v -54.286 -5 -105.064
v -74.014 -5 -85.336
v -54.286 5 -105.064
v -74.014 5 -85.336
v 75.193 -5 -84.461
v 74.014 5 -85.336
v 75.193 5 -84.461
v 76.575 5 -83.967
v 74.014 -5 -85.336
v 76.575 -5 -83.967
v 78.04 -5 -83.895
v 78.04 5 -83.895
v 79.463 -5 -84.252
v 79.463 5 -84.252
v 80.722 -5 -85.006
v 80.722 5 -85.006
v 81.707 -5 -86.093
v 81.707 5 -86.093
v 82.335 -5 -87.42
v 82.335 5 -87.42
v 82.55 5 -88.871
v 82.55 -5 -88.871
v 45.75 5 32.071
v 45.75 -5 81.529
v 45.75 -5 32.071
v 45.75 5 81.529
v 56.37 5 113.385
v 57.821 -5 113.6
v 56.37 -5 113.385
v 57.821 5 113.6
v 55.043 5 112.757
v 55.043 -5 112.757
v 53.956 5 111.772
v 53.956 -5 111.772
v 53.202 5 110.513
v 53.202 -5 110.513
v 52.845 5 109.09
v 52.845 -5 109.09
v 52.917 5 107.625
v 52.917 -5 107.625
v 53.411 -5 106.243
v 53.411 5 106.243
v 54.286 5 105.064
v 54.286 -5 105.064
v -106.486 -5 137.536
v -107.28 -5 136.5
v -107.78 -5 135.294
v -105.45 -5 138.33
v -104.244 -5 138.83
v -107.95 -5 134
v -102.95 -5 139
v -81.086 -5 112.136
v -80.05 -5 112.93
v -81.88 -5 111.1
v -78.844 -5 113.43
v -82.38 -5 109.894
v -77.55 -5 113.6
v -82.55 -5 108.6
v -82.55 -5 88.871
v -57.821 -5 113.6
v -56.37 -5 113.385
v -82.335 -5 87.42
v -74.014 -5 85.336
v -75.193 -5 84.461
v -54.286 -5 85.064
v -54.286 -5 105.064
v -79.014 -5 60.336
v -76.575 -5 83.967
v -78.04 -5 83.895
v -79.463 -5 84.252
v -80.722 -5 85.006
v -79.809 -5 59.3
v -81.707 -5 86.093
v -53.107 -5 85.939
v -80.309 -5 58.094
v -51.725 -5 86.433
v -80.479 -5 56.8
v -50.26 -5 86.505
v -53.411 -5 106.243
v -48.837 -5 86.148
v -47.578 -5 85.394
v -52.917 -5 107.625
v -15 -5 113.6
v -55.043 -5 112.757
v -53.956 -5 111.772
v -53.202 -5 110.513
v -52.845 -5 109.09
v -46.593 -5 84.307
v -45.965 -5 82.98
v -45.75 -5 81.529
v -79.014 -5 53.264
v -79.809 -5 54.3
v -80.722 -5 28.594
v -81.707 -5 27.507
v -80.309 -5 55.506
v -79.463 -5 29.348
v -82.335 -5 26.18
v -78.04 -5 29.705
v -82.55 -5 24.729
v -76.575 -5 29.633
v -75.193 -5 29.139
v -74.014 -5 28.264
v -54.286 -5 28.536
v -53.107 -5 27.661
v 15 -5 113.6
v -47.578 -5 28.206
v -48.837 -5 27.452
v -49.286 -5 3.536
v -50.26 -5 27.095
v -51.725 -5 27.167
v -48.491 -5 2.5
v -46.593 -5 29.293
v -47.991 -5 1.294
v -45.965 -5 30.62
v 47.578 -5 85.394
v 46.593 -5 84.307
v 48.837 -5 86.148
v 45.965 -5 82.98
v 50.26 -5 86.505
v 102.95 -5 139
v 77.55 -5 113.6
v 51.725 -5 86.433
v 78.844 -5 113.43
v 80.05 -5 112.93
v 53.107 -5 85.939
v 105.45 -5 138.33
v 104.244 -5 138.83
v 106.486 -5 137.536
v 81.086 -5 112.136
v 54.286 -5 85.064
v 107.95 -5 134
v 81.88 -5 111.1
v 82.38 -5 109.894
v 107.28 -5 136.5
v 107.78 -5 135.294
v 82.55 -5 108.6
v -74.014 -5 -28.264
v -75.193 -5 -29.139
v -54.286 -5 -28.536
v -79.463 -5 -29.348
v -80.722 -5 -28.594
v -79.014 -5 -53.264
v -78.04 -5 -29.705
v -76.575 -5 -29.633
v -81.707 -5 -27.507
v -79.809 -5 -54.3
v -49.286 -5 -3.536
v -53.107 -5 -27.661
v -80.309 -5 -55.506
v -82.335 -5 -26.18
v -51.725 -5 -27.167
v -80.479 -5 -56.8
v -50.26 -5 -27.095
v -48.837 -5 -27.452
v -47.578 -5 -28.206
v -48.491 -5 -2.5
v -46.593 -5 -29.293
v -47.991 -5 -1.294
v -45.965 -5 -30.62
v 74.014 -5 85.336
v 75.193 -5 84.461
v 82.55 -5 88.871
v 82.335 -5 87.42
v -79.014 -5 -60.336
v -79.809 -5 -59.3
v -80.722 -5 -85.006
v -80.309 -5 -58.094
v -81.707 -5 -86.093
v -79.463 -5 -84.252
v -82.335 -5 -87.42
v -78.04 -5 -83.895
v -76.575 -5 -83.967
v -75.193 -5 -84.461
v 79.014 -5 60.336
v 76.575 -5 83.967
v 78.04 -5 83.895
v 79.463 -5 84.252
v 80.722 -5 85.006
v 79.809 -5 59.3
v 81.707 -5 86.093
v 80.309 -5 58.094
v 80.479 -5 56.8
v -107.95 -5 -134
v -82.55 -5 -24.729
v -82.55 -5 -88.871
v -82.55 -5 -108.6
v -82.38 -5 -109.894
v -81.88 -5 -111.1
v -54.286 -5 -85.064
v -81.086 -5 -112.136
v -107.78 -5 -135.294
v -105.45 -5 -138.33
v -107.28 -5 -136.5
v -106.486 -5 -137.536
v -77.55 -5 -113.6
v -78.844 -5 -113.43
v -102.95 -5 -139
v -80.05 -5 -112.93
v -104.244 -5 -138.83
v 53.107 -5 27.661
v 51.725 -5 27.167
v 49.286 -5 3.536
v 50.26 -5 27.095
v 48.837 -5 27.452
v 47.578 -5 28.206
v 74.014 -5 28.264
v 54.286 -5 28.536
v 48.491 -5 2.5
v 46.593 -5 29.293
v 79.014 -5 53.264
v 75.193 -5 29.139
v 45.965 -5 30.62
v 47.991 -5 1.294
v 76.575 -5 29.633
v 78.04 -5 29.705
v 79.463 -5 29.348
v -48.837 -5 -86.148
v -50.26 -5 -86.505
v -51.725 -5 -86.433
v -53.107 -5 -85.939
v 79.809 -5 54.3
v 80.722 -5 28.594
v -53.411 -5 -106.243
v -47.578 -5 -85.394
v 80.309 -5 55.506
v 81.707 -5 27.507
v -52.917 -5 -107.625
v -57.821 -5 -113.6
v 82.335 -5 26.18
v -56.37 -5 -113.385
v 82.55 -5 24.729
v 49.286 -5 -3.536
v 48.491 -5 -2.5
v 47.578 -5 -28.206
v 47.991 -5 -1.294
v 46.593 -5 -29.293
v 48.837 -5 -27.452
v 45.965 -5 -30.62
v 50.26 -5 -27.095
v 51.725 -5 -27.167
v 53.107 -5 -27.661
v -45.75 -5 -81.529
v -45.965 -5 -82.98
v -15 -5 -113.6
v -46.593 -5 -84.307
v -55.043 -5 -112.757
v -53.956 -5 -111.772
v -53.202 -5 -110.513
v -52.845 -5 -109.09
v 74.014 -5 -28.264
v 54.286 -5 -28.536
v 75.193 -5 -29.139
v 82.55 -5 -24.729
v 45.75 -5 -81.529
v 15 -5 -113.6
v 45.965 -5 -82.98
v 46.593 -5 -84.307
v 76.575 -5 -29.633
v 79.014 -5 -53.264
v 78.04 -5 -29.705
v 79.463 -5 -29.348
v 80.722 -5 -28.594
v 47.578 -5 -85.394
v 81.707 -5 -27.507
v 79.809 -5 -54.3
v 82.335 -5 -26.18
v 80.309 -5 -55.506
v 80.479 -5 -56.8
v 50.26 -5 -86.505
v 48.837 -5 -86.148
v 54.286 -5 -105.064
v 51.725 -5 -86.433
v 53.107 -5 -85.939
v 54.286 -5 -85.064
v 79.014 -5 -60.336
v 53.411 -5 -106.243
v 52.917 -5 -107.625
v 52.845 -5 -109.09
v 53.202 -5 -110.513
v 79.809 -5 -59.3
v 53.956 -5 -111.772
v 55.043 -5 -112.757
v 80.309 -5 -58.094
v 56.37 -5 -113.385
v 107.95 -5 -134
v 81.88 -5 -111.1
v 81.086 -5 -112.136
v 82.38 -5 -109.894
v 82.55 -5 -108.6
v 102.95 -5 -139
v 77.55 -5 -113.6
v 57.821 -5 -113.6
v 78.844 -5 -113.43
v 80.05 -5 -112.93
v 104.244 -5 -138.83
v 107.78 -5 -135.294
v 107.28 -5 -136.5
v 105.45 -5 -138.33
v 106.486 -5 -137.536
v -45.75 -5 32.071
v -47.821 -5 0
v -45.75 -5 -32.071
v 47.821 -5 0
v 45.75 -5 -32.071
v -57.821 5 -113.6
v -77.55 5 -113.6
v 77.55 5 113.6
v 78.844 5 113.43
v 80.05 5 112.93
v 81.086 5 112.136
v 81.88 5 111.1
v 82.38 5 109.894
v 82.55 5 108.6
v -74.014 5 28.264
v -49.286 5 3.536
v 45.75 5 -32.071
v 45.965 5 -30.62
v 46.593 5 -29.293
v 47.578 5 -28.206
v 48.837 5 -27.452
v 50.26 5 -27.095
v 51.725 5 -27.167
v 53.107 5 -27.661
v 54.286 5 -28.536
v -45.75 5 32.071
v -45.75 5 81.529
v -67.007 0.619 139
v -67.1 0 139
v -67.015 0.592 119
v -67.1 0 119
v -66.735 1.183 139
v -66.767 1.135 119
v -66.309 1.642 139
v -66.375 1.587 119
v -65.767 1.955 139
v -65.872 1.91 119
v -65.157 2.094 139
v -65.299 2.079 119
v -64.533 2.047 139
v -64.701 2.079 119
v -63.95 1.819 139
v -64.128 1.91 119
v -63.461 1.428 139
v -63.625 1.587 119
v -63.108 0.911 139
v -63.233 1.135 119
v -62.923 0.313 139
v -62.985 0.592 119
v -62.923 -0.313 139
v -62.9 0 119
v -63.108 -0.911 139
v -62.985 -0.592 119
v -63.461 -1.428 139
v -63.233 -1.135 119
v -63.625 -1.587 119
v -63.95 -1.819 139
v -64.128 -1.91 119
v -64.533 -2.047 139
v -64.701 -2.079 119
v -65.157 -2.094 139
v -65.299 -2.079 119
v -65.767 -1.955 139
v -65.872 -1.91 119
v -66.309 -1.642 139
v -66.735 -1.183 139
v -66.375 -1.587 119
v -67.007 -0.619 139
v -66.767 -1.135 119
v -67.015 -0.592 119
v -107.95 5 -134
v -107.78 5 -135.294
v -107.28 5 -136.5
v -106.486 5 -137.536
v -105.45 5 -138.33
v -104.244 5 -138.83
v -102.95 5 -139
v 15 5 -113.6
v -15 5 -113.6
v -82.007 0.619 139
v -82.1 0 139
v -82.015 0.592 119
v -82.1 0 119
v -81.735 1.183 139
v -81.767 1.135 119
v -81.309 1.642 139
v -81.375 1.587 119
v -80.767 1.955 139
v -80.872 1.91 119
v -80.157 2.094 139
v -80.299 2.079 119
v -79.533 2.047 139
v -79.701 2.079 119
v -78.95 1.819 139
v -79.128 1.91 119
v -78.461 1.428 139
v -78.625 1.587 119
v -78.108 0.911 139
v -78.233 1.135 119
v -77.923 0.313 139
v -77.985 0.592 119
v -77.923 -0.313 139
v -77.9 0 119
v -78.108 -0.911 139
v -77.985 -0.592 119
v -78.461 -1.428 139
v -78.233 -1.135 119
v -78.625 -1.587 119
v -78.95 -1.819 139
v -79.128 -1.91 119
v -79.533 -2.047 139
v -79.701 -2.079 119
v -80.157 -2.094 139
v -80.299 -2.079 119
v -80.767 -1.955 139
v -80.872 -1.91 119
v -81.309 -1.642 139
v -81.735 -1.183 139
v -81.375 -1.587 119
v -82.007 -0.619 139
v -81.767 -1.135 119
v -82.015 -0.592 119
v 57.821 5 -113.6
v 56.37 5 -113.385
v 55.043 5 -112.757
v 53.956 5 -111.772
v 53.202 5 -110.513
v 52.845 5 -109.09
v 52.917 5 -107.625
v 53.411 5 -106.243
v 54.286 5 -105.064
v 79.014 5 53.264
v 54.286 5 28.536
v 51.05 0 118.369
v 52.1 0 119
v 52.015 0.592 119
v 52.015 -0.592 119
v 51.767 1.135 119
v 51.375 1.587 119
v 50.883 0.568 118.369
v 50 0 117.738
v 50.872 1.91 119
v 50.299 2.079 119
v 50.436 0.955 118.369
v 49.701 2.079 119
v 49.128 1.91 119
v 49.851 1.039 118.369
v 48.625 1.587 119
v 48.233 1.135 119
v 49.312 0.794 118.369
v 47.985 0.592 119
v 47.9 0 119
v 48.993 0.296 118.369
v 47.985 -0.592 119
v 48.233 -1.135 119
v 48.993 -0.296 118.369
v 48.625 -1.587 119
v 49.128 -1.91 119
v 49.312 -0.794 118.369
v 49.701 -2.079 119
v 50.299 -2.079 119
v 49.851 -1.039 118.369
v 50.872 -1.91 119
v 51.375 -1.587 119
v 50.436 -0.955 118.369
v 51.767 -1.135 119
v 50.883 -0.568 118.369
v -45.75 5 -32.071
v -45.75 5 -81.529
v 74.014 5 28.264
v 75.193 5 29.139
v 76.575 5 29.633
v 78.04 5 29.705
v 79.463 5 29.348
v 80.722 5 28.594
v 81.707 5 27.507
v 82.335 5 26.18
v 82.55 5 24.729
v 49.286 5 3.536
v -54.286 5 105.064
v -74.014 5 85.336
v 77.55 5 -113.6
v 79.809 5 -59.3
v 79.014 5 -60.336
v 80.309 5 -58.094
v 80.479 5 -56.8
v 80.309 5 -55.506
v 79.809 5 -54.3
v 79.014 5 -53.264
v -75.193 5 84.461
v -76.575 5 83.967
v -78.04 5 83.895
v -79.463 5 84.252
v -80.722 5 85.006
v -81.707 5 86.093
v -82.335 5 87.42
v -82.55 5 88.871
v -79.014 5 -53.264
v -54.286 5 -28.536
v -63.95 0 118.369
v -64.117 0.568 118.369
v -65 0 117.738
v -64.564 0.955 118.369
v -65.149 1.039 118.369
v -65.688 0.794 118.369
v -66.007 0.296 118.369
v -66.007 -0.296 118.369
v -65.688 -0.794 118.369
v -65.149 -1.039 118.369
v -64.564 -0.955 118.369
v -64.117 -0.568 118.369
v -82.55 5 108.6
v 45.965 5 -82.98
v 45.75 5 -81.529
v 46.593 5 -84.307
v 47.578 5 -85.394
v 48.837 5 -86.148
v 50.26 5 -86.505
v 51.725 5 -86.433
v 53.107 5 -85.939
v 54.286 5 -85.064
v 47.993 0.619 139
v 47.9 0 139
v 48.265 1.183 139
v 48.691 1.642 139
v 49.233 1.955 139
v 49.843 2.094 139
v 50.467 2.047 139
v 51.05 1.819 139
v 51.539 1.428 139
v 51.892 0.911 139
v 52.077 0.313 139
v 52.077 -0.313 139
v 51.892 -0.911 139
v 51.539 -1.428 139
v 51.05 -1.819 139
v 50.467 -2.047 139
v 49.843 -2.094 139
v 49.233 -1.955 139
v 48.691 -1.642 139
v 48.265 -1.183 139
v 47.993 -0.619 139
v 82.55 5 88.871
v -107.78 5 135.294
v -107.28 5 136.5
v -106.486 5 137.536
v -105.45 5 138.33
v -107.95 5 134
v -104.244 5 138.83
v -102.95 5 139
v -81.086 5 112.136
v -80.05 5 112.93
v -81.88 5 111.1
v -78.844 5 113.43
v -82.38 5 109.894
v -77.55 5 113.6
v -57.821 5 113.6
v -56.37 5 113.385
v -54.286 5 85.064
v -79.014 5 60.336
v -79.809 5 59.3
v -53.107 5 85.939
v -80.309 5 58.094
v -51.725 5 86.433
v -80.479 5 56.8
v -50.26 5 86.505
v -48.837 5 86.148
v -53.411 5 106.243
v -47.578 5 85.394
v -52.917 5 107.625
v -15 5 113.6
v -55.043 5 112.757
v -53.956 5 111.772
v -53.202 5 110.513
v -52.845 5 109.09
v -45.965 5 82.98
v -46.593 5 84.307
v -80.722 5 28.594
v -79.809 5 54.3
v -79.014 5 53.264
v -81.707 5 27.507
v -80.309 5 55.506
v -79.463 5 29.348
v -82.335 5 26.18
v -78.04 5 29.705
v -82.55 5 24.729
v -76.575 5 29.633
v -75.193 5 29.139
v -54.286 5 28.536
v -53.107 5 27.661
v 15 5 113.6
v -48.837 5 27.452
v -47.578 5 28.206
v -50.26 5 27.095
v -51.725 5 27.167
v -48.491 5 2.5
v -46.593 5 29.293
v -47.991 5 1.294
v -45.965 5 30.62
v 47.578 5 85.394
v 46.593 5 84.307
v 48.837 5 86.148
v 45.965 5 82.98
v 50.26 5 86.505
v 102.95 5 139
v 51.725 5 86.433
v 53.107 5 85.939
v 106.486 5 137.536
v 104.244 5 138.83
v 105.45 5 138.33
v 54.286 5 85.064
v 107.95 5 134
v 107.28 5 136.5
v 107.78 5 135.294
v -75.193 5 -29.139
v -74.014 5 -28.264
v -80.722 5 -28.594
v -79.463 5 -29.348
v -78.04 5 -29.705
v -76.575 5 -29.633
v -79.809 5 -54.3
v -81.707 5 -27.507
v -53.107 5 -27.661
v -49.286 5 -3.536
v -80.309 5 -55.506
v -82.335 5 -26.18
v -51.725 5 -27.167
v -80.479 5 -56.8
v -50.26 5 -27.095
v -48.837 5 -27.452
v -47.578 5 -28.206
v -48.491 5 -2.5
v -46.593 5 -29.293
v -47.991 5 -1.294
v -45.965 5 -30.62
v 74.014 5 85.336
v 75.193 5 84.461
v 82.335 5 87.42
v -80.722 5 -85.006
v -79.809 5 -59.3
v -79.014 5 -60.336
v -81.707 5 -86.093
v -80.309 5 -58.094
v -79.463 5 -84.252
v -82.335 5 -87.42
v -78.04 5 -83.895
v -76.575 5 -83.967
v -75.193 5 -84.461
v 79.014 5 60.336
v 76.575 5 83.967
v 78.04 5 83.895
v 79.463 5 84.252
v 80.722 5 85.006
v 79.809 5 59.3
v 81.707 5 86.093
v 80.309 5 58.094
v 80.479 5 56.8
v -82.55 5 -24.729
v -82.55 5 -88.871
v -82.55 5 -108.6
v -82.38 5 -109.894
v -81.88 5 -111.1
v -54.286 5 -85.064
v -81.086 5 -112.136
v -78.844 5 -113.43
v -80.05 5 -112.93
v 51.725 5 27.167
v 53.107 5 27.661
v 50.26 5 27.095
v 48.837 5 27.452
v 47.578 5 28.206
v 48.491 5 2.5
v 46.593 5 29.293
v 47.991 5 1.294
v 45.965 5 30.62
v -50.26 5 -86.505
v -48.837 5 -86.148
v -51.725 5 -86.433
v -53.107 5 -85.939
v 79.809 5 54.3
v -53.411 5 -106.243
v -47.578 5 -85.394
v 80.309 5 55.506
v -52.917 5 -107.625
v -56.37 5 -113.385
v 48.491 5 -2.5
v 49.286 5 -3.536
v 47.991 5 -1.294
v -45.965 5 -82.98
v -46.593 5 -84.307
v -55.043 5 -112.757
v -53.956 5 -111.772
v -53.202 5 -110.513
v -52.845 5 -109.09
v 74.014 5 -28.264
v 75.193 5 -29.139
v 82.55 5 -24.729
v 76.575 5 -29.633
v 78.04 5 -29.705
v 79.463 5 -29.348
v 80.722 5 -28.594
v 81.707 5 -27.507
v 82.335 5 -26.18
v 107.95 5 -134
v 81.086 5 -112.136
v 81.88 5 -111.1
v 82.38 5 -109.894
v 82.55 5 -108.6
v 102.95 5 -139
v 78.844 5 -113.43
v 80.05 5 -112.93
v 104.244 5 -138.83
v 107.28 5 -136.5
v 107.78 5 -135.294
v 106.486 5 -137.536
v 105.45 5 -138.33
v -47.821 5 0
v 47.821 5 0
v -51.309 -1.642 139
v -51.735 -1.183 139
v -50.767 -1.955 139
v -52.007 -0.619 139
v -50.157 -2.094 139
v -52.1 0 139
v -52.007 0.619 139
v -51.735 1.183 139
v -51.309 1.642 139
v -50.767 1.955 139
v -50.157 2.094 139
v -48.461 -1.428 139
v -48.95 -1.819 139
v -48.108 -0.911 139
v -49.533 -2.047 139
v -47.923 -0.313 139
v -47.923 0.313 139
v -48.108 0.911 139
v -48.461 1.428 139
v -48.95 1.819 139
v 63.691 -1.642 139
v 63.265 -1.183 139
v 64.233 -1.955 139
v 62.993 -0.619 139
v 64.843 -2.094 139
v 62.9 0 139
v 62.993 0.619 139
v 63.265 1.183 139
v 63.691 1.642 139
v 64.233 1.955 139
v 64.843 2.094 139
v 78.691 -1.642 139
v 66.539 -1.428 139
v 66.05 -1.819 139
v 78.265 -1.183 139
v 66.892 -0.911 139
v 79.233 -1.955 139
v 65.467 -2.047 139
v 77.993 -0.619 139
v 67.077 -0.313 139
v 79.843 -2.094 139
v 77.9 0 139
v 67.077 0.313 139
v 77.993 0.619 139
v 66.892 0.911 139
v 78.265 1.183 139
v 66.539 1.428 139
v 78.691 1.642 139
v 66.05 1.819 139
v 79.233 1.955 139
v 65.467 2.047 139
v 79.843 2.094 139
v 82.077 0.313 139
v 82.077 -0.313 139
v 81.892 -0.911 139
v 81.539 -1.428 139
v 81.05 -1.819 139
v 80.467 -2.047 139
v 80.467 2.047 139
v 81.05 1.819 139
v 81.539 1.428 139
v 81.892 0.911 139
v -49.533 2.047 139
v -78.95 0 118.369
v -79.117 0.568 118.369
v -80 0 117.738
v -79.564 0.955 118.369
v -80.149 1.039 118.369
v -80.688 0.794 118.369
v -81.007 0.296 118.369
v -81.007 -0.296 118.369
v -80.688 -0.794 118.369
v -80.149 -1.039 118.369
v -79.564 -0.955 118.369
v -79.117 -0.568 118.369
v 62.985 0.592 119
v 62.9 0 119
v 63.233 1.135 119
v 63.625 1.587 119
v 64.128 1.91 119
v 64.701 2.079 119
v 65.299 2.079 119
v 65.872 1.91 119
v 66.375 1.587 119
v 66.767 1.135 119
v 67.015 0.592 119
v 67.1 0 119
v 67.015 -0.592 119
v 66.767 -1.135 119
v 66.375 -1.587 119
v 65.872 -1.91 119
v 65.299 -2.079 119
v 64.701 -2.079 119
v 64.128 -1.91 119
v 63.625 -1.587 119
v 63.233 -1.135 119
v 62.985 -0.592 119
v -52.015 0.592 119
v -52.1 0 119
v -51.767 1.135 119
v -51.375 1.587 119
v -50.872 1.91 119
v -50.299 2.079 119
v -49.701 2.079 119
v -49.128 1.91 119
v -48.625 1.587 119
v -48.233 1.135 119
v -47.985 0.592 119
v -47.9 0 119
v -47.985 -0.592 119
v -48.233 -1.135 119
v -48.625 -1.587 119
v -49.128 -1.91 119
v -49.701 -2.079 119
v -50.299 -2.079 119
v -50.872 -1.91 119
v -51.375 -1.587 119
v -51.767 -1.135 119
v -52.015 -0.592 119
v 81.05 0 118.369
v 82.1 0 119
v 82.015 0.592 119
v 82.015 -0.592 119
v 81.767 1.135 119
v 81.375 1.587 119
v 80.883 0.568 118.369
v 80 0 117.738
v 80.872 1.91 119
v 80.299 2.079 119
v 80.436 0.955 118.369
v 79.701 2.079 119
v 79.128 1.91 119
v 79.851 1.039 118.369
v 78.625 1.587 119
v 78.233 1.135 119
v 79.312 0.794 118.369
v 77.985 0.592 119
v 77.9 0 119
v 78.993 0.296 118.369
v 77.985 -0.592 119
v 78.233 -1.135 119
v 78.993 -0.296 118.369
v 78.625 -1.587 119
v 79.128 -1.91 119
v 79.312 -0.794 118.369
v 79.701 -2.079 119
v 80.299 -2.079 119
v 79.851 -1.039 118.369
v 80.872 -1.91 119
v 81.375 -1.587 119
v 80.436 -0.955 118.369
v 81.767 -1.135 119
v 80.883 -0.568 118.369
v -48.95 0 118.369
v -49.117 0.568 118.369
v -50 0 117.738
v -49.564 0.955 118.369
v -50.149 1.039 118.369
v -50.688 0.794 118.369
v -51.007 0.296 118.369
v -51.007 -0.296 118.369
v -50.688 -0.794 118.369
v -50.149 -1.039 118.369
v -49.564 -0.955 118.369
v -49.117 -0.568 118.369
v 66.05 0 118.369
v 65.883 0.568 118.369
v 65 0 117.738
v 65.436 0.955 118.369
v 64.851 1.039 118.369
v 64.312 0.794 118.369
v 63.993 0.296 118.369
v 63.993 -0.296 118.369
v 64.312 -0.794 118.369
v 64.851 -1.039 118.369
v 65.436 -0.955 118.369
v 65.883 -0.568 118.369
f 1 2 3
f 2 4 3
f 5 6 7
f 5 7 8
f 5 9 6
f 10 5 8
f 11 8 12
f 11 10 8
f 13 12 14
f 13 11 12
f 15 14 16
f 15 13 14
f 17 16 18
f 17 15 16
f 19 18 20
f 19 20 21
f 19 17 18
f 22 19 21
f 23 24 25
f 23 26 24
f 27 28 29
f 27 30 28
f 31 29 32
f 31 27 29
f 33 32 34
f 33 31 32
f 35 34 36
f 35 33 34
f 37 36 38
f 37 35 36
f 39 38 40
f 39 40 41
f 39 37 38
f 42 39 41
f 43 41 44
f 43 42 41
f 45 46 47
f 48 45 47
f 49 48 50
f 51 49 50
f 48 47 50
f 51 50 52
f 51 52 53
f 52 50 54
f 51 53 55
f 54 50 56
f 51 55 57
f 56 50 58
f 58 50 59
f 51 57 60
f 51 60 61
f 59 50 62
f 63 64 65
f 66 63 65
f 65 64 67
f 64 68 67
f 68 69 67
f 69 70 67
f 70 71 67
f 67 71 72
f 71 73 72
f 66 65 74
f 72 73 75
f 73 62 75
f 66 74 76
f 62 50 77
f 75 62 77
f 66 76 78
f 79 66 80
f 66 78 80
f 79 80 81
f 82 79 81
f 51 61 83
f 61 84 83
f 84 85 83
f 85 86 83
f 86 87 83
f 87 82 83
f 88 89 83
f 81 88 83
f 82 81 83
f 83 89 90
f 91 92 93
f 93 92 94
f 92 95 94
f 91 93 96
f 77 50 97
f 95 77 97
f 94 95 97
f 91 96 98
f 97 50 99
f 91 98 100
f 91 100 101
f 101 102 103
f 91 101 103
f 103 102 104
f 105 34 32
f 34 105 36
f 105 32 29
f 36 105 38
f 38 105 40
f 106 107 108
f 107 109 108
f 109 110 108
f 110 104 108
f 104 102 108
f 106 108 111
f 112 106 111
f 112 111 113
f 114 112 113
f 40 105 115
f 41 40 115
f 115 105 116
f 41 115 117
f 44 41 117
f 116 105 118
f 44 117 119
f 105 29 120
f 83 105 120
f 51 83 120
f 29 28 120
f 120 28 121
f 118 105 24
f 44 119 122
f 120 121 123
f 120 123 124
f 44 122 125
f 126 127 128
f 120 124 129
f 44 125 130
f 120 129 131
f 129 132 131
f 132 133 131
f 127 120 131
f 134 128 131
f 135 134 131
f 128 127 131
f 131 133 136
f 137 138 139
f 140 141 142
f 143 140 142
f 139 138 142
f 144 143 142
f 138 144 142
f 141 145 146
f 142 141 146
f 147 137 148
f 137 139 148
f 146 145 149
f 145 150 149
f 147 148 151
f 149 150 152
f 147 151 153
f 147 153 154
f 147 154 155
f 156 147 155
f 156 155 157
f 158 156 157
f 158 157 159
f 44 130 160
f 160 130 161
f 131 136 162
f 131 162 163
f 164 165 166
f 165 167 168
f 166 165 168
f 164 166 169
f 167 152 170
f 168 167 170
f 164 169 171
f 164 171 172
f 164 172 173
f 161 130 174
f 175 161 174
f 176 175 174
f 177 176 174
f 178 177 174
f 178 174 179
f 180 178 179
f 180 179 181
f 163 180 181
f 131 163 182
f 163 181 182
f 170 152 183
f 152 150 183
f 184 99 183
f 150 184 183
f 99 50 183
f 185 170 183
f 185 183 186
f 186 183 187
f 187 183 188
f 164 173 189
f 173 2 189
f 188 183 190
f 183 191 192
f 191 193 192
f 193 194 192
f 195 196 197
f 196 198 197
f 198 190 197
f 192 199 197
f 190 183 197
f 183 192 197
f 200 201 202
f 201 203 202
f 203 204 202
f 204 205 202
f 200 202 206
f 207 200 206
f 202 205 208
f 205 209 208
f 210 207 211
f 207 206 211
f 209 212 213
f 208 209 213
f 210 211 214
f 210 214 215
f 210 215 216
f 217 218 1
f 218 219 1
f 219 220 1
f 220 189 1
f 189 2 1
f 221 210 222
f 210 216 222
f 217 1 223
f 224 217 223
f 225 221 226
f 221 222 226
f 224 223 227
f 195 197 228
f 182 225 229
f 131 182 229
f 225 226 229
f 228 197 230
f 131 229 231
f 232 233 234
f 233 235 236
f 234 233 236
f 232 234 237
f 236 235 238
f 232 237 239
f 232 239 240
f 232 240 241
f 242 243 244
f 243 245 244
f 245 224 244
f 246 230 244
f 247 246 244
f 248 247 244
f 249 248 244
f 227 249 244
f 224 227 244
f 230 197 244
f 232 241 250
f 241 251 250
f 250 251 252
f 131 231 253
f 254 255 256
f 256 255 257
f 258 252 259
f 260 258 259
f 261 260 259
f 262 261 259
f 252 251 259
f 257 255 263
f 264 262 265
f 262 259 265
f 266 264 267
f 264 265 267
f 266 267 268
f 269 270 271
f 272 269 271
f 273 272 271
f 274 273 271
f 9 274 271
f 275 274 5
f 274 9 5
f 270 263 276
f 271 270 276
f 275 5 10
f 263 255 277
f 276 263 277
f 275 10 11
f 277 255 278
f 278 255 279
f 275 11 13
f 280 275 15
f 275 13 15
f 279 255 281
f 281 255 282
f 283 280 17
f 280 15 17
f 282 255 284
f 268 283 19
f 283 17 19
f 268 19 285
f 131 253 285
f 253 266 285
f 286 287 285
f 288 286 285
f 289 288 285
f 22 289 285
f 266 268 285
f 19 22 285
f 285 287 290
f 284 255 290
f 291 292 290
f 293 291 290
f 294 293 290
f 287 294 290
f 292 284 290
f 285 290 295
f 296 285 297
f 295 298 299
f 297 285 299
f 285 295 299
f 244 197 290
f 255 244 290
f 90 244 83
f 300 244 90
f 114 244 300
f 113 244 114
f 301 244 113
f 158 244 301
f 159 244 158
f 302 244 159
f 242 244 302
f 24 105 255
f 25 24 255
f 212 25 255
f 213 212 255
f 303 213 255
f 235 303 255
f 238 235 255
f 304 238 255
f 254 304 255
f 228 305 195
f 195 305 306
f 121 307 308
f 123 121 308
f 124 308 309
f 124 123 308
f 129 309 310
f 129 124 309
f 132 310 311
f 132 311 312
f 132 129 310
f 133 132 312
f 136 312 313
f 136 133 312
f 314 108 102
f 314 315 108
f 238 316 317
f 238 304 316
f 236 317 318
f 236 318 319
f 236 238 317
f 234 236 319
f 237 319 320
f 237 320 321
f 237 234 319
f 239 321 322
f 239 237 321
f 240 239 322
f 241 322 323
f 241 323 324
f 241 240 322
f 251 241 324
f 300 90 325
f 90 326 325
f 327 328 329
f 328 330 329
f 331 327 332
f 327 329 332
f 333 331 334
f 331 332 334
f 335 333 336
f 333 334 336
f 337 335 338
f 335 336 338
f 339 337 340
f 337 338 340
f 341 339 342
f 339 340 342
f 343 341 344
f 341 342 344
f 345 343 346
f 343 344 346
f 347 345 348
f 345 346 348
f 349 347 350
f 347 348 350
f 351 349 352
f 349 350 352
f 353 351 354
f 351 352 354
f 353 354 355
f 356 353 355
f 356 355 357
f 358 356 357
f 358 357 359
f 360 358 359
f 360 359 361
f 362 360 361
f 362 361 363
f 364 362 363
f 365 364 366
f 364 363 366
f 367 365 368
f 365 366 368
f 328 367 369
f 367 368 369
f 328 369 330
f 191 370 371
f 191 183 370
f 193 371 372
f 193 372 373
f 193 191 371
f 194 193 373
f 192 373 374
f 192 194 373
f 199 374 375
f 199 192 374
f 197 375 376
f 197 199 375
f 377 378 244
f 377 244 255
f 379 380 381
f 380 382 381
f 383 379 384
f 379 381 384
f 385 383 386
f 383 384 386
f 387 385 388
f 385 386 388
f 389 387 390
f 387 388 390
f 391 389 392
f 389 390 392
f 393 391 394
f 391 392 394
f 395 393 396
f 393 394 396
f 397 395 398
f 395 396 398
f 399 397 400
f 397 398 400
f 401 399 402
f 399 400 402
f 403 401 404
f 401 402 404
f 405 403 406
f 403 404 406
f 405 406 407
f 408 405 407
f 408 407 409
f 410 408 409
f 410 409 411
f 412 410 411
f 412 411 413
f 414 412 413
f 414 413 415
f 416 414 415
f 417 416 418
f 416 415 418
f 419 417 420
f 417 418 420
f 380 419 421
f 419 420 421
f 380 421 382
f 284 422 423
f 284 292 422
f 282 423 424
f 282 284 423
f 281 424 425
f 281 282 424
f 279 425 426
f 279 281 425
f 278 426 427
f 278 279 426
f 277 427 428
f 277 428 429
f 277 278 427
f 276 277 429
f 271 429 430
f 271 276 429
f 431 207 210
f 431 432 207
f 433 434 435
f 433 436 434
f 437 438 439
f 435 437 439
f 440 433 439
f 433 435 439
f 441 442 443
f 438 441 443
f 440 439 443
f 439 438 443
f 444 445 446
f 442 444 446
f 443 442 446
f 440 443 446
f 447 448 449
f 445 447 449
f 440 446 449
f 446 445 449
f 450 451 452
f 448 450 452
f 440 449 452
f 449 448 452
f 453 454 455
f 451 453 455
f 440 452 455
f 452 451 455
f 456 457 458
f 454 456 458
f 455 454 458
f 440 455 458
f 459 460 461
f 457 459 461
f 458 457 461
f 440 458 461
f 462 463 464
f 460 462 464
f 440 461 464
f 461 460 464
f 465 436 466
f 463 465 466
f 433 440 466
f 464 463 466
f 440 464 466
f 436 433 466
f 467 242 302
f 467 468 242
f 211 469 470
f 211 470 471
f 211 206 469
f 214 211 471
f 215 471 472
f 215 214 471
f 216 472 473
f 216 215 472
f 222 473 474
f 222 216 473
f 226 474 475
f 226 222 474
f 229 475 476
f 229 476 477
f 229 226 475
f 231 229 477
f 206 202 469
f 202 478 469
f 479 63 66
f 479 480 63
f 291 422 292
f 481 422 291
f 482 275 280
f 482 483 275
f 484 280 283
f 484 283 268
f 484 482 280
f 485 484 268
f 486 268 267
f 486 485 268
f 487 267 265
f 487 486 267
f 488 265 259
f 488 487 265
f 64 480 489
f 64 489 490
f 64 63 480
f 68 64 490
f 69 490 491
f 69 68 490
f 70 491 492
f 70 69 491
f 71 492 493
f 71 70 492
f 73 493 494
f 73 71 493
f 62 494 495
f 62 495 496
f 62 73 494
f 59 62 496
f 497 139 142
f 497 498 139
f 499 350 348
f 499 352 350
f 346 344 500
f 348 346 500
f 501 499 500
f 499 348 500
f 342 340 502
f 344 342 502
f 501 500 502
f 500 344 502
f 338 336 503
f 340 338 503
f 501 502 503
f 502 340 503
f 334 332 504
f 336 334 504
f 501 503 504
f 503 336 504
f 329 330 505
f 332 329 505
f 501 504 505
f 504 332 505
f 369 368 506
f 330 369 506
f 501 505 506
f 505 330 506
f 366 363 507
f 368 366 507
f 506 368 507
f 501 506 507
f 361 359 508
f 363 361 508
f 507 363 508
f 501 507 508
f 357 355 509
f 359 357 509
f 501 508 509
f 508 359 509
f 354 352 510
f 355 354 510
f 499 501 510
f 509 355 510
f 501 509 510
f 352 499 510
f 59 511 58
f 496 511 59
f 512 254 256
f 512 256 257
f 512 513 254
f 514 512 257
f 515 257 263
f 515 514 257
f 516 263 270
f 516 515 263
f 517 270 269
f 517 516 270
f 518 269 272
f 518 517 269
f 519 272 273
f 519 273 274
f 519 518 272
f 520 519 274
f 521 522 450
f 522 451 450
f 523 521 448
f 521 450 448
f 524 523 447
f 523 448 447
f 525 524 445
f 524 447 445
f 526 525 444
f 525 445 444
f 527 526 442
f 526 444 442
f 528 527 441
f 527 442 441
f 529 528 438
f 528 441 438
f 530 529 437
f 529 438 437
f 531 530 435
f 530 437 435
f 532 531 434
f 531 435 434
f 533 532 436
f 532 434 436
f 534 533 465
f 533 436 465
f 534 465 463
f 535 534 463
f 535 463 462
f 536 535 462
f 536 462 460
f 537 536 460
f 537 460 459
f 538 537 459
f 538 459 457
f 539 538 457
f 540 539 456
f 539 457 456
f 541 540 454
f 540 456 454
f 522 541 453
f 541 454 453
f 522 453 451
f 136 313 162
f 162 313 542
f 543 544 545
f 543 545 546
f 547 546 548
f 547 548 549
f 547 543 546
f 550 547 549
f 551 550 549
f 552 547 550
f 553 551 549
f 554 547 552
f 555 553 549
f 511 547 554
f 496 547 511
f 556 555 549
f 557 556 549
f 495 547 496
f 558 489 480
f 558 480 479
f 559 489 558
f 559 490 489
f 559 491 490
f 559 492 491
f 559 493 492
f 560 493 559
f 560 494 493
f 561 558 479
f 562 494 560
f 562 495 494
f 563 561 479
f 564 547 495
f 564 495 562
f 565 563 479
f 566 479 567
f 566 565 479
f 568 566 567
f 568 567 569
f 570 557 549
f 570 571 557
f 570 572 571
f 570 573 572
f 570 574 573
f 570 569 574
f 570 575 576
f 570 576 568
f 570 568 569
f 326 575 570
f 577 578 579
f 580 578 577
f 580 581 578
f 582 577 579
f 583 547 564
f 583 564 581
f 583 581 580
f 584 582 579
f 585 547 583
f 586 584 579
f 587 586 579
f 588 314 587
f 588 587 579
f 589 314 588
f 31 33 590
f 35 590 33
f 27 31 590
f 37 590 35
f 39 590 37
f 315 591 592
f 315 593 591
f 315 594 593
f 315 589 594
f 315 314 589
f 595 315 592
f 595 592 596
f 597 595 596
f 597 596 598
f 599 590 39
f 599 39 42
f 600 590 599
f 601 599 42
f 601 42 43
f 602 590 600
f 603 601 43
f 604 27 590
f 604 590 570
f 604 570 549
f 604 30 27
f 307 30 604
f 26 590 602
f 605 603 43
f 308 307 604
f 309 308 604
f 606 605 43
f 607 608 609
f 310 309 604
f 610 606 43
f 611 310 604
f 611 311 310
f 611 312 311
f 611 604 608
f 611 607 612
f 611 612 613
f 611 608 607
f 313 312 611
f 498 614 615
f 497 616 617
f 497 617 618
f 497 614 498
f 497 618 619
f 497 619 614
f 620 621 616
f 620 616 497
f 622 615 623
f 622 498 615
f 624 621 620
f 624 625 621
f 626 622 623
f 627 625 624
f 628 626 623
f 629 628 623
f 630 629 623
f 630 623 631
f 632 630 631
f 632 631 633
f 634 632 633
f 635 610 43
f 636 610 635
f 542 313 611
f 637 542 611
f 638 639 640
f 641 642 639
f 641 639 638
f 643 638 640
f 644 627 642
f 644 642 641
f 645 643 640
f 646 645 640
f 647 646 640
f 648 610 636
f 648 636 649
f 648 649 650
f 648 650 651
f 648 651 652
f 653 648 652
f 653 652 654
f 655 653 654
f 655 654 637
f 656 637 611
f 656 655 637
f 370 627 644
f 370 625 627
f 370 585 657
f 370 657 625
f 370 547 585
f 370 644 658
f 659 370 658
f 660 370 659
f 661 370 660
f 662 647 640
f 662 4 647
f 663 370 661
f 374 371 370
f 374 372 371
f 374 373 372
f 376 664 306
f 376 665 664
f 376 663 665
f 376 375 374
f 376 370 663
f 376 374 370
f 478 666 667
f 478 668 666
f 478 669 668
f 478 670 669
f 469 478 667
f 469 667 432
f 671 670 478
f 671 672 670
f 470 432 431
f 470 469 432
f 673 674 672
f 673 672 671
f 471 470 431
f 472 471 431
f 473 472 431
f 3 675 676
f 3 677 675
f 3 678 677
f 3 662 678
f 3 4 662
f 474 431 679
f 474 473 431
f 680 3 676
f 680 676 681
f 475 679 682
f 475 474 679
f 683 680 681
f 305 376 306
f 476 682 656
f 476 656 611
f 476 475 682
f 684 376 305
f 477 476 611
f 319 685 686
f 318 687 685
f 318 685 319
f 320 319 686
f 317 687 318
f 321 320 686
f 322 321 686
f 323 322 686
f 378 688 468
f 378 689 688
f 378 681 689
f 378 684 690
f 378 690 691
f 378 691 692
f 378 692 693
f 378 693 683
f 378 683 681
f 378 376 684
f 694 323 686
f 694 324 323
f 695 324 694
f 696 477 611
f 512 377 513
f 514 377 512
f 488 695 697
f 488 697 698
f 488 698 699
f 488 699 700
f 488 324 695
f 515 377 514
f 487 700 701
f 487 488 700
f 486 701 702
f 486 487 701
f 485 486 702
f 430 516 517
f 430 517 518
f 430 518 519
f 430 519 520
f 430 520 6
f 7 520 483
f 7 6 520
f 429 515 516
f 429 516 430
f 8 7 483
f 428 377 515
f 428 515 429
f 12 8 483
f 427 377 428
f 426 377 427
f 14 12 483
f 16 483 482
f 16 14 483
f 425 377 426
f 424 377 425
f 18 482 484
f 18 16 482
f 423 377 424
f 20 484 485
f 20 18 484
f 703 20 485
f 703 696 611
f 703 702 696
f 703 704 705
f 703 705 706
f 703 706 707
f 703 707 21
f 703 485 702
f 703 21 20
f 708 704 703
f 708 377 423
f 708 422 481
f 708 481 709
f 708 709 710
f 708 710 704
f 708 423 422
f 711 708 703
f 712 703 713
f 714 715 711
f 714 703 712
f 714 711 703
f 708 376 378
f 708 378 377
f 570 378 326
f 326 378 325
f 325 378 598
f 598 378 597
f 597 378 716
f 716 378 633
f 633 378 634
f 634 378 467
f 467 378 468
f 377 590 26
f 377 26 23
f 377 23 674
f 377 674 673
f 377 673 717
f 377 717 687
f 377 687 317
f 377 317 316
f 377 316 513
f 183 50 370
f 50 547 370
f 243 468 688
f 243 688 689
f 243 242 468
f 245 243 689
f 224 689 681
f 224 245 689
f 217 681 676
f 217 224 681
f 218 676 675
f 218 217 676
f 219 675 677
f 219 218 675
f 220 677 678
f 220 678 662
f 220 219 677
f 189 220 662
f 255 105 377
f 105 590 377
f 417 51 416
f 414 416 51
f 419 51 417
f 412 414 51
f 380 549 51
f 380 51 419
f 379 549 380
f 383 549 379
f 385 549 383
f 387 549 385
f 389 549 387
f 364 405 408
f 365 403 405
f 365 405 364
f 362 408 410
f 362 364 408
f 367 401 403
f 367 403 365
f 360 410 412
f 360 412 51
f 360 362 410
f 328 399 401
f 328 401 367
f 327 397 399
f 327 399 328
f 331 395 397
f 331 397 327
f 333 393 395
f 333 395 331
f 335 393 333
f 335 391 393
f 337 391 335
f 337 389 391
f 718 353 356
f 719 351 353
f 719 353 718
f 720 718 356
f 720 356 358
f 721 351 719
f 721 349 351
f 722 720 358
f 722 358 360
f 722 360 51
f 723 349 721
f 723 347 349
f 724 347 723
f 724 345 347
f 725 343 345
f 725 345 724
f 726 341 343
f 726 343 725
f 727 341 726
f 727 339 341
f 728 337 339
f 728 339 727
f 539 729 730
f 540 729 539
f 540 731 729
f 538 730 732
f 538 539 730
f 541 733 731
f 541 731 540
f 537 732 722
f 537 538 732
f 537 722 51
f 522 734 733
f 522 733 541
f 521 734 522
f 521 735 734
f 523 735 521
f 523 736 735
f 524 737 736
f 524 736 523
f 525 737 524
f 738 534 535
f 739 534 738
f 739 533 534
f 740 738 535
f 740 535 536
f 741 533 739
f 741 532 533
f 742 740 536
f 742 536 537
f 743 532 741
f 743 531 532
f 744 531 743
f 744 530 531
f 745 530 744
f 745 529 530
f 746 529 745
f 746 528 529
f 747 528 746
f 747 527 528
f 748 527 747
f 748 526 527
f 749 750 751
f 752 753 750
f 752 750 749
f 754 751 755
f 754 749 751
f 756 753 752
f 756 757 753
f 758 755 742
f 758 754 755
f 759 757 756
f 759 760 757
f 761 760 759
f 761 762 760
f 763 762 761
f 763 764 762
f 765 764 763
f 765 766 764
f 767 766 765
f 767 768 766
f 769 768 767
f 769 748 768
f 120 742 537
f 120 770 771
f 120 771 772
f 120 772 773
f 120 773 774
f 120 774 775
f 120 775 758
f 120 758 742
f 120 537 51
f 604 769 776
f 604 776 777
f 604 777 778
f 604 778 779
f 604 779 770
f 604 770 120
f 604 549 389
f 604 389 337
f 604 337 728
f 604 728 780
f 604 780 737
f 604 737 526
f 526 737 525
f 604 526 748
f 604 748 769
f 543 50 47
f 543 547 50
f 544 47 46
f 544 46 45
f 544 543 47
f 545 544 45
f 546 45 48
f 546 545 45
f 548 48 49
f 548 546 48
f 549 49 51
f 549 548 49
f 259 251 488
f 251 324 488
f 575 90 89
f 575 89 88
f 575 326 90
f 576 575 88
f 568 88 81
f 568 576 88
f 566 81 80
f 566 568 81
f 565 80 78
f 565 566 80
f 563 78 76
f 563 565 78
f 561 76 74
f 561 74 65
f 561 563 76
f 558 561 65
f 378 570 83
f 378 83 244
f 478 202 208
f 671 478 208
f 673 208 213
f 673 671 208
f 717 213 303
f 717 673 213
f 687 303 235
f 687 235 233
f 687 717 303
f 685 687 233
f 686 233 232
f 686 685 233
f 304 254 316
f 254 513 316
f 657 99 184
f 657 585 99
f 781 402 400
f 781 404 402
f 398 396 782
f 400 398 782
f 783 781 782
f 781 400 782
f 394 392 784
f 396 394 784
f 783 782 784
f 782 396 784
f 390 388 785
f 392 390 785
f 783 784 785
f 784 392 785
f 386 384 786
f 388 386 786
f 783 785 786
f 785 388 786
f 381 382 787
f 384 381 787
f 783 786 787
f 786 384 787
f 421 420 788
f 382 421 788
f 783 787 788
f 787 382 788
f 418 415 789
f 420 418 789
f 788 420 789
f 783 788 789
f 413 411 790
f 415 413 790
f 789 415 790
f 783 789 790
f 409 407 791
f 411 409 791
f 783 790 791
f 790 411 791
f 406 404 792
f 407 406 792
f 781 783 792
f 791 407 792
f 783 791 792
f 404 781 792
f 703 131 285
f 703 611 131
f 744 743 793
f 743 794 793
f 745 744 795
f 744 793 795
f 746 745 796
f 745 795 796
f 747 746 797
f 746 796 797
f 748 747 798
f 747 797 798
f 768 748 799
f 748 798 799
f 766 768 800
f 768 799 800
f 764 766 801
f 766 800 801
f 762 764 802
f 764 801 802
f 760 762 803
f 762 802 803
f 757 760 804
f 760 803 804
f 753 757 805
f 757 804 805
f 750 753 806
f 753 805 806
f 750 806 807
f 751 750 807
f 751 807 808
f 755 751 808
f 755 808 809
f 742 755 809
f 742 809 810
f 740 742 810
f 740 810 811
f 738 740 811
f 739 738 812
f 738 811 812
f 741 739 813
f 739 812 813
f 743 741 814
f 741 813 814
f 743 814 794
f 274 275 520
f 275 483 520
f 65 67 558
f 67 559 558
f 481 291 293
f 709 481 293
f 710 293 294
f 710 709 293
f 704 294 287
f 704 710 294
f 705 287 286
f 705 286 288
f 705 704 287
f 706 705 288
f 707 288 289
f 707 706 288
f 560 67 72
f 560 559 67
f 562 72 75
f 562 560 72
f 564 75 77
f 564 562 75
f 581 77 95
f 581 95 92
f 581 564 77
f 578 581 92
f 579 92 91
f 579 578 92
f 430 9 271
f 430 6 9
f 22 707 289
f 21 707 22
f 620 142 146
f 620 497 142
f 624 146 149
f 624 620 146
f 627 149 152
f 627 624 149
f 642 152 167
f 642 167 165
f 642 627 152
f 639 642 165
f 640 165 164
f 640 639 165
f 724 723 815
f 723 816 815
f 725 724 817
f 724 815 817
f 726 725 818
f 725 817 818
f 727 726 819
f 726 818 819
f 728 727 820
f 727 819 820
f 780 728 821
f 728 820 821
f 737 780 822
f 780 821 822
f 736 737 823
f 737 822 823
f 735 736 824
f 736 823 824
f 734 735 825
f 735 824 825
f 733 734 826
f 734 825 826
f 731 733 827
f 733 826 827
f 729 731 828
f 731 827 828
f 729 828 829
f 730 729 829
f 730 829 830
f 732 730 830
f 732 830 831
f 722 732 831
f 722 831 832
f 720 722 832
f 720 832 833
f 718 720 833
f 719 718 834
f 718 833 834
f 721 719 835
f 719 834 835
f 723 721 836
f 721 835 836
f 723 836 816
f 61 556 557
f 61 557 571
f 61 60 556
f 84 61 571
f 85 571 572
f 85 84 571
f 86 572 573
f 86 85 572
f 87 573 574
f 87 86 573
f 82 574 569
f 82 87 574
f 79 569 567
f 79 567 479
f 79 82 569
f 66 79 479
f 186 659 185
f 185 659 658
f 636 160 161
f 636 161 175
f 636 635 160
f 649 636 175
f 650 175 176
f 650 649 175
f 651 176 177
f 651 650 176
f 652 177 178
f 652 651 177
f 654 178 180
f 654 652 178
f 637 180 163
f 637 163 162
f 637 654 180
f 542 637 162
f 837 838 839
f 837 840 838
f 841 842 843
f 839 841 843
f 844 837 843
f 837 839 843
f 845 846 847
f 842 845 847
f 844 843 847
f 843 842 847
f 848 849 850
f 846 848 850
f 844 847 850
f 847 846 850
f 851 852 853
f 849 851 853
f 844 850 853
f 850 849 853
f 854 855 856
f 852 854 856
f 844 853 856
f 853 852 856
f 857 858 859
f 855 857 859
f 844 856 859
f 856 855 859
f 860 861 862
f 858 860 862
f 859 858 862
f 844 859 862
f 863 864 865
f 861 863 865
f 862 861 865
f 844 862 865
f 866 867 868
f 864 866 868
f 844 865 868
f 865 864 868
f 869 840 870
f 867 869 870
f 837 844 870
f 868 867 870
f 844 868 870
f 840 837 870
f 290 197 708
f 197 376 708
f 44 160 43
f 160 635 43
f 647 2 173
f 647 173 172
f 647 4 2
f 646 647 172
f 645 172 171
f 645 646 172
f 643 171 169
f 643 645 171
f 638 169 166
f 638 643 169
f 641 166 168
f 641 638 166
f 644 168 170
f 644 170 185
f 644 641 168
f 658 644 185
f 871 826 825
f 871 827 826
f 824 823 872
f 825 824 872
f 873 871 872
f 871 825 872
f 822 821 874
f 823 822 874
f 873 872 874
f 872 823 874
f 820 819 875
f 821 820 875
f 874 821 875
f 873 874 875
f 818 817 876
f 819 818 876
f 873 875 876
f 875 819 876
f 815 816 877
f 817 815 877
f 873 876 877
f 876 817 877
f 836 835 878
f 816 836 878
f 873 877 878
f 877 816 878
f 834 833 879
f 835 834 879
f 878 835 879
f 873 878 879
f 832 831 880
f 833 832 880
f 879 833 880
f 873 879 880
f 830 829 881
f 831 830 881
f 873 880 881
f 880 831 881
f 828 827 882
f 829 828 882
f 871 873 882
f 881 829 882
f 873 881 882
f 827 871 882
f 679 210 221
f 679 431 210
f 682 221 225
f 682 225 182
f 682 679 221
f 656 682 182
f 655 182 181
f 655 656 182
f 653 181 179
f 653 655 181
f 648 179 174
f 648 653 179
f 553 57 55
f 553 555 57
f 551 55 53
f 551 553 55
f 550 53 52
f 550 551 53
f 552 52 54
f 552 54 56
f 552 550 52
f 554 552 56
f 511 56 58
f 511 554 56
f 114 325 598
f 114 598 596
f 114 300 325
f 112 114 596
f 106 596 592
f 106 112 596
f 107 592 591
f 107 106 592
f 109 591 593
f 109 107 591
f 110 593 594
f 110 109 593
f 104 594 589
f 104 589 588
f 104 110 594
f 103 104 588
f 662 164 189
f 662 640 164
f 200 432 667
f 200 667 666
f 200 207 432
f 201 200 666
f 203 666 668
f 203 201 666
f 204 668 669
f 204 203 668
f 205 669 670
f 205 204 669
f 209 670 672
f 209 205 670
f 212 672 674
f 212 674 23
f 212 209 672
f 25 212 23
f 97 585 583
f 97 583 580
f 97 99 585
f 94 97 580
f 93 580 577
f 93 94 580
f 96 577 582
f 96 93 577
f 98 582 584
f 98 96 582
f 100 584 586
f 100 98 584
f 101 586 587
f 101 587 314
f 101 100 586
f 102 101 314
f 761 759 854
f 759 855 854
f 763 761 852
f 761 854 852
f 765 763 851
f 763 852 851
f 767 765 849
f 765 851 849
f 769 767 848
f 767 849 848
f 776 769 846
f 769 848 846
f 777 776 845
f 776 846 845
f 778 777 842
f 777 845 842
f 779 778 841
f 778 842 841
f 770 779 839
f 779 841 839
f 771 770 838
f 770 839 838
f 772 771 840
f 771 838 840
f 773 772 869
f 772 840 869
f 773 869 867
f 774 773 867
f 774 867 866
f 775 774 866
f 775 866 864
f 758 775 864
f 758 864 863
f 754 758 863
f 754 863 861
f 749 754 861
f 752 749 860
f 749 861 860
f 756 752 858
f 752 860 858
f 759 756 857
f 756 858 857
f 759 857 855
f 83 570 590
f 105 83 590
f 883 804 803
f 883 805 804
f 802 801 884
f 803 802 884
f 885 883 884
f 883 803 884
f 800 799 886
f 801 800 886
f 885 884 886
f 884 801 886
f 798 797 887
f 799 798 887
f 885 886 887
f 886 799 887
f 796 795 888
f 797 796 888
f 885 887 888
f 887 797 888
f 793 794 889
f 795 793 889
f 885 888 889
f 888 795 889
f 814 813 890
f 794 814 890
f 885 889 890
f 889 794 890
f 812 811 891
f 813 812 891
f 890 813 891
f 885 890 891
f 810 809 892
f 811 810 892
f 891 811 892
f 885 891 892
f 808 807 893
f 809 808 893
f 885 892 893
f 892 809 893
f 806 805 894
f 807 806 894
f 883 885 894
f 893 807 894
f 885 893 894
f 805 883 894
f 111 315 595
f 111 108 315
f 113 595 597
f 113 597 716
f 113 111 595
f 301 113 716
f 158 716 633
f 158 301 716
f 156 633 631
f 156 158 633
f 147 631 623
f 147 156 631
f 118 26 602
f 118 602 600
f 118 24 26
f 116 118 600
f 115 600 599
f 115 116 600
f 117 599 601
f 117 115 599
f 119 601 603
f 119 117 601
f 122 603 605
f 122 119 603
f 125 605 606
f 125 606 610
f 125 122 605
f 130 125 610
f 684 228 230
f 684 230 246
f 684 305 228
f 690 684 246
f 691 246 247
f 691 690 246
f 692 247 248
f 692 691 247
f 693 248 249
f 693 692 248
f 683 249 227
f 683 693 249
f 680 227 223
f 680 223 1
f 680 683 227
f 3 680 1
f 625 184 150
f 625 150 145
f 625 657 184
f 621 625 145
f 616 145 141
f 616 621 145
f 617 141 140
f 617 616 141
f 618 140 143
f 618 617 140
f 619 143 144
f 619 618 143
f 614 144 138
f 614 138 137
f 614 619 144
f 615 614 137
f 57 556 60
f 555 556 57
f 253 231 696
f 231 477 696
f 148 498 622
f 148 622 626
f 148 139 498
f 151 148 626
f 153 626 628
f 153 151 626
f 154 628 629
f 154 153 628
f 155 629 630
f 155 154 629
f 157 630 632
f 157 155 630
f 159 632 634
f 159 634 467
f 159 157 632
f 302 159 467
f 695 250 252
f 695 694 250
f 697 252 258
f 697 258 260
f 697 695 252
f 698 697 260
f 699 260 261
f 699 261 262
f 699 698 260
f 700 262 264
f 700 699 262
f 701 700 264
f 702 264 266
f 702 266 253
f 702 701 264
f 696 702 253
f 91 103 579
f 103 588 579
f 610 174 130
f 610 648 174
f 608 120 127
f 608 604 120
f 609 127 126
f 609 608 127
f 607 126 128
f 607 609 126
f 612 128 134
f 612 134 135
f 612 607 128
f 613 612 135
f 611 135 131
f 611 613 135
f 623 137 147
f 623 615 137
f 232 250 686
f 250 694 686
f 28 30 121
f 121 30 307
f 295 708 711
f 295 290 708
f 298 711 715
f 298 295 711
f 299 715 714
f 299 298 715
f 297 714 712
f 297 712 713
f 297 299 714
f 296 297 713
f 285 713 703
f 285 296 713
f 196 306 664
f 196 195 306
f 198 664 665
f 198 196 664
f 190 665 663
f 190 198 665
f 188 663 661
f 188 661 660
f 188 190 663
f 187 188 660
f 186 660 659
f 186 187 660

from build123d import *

# Parameters (mm, degrees)
SKETCH1_W                       = 215.9
SKETCH1_H                       = 278
SKETCH1_W_2                     = 30
SKETCH1_H_2                     = 227.2
BOSS_EXTRUDE1_DEPTH             = 5
TAP_DRILL_FOR_M5X0_8_TAP1_D     = 4.2
TAP_DRILL_FOR_M5X0_8_TAP1_DEPTH = 20
TAP_DRILL_FOR_M5X0_8_TAP1_TIP   = 1.2618073
FILLET1_R                       = 5


with BuildPart() as part:
    # Sketch1 → Boss-Extrude1 (new body, symmetric)
    with BuildSketch(Plane(origin=(0, 0, 0), x_dir=(1, 0, 0), z_dir=(0, 1, 0))):
        Rectangle(SKETCH1_W, SKETCH1_H)
        Polygon((-45.75, 113.6), (-82.55, 113.6), (-82.55, 76.8), align=None, mode=Mode.SUBTRACT)
        Rectangle(SKETCH1_W_2, SKETCH1_H_2, mode=Mode.SUBTRACT)
        Polygon((-82.55, 56.8), (-45.75, 93.6), (-45.75, 20), align=None, mode=Mode.SUBTRACT)
        Polygon((-82.55, 36.8), (-45.75, 0), (-82.55, -36.8), align=None, mode=Mode.SUBTRACT)
        Polygon((-82.55, -113.6), (-82.55, -76.8), (-45.75, -113.6), align=None, mode=Mode.SUBTRACT)
        Polygon((-45.75, -93.6), (-45.75, -20), (-82.55, -56.8), align=None, mode=Mode.SUBTRACT)
        Polygon((45.75, -113.6), (82.55, -113.6), (82.55, -76.8), align=None, mode=Mode.SUBTRACT)
        Polygon((82.55, -56.8), (45.75, -93.6), (45.75, -20), align=None, mode=Mode.SUBTRACT)
        Polygon((45.75, 0), (82.55, -36.8), (82.55, 36.8), align=None, mode=Mode.SUBTRACT)
        Polygon((45.75, 93.6), (45.75, 20), (82.55, 56.8), align=None, mode=Mode.SUBTRACT)
        Polygon((82.55, 113.6), (82.55, 76.8), (45.75, 113.6), align=None, mode=Mode.SUBTRACT)
    extrude(amount=BOSS_EXTRUDE1_DEPTH, both=True)

    # Tap Drill for M5x0.8 Tap1
    with Locations(Plane(origin=(-80, 0, 139), x_dir=(1, 0, 0), z_dir=(0, 0, 1))):
        with Locations((0, 0), (15, 0), (30, 0), (130, 0), (145, 0), (160, 0)):
            Hole(TAP_DRILL_FOR_M5X0_8_TAP1_D / 2, depth=TAP_DRILL_FOR_M5X0_8_TAP1_DEPTH)
            with Locations((0, 0, -(TAP_DRILL_FOR_M5X0_8_TAP1_DEPTH + TAP_DRILL_FOR_M5X0_8_TAP1_TIP / 2))):  # 118° drill point
                Cone(0, TAP_DRILL_FOR_M5X0_8_TAP1_D / 2, TAP_DRILL_FOR_M5X0_8_TAP1_TIP, mode=Mode.SUBTRACT)

    # Fillet1
    fillet1_edges = [part.edges().sort_by_distance(p)[0] for p in [
        (45.75, 0, 0),
        (82.55, 0, 36.8),
        (82.55, 0, -56.8),
        (45.75, 0, -93.6),
        (45.75, 0, -20),
        (82.55, 0, -113.6),
        (45.75, 0, -113.6),
        (82.55, 0, -76.8),
        (-82.55, 0, -76.8),
        (-45.75, 0, -113.6),
        (-82.55, 0, -113.6),
        (-82.55, 0, -56.8),
        (-45.75, 0, -20),
        (-45.75, 0, -93.6),
        (-82.55, 0, -36.8),
        (-82.55, 0, 36.8),
        (-45.75, 0, 0),
        (-82.55, 0, 113.6),
        (-45.75, 0, 113.6),
        (-82.55, 0, 76.8),
        (-82.55, 0, 56.8),
        (-45.75, 0, 93.6),
        (-45.75, 0, 20),
        (-107.95, 0, -139),
        (82.55, 0, 76.8),
        (45.75, 0, 113.6),
        (107.95, 0, -139),
        (82.55, 0, 113.6),
        (107.95, 0, 139),
        (-107.95, 0, 139),
        (82.55, 0, 56.8),
        (45.75, 0, 20),
        (45.75, 0, 93.6),
        (82.55, 0, -36.8),
    ]]
    fillet(fillet1_edges, radius=FILLET1_R)


solid = part.part
